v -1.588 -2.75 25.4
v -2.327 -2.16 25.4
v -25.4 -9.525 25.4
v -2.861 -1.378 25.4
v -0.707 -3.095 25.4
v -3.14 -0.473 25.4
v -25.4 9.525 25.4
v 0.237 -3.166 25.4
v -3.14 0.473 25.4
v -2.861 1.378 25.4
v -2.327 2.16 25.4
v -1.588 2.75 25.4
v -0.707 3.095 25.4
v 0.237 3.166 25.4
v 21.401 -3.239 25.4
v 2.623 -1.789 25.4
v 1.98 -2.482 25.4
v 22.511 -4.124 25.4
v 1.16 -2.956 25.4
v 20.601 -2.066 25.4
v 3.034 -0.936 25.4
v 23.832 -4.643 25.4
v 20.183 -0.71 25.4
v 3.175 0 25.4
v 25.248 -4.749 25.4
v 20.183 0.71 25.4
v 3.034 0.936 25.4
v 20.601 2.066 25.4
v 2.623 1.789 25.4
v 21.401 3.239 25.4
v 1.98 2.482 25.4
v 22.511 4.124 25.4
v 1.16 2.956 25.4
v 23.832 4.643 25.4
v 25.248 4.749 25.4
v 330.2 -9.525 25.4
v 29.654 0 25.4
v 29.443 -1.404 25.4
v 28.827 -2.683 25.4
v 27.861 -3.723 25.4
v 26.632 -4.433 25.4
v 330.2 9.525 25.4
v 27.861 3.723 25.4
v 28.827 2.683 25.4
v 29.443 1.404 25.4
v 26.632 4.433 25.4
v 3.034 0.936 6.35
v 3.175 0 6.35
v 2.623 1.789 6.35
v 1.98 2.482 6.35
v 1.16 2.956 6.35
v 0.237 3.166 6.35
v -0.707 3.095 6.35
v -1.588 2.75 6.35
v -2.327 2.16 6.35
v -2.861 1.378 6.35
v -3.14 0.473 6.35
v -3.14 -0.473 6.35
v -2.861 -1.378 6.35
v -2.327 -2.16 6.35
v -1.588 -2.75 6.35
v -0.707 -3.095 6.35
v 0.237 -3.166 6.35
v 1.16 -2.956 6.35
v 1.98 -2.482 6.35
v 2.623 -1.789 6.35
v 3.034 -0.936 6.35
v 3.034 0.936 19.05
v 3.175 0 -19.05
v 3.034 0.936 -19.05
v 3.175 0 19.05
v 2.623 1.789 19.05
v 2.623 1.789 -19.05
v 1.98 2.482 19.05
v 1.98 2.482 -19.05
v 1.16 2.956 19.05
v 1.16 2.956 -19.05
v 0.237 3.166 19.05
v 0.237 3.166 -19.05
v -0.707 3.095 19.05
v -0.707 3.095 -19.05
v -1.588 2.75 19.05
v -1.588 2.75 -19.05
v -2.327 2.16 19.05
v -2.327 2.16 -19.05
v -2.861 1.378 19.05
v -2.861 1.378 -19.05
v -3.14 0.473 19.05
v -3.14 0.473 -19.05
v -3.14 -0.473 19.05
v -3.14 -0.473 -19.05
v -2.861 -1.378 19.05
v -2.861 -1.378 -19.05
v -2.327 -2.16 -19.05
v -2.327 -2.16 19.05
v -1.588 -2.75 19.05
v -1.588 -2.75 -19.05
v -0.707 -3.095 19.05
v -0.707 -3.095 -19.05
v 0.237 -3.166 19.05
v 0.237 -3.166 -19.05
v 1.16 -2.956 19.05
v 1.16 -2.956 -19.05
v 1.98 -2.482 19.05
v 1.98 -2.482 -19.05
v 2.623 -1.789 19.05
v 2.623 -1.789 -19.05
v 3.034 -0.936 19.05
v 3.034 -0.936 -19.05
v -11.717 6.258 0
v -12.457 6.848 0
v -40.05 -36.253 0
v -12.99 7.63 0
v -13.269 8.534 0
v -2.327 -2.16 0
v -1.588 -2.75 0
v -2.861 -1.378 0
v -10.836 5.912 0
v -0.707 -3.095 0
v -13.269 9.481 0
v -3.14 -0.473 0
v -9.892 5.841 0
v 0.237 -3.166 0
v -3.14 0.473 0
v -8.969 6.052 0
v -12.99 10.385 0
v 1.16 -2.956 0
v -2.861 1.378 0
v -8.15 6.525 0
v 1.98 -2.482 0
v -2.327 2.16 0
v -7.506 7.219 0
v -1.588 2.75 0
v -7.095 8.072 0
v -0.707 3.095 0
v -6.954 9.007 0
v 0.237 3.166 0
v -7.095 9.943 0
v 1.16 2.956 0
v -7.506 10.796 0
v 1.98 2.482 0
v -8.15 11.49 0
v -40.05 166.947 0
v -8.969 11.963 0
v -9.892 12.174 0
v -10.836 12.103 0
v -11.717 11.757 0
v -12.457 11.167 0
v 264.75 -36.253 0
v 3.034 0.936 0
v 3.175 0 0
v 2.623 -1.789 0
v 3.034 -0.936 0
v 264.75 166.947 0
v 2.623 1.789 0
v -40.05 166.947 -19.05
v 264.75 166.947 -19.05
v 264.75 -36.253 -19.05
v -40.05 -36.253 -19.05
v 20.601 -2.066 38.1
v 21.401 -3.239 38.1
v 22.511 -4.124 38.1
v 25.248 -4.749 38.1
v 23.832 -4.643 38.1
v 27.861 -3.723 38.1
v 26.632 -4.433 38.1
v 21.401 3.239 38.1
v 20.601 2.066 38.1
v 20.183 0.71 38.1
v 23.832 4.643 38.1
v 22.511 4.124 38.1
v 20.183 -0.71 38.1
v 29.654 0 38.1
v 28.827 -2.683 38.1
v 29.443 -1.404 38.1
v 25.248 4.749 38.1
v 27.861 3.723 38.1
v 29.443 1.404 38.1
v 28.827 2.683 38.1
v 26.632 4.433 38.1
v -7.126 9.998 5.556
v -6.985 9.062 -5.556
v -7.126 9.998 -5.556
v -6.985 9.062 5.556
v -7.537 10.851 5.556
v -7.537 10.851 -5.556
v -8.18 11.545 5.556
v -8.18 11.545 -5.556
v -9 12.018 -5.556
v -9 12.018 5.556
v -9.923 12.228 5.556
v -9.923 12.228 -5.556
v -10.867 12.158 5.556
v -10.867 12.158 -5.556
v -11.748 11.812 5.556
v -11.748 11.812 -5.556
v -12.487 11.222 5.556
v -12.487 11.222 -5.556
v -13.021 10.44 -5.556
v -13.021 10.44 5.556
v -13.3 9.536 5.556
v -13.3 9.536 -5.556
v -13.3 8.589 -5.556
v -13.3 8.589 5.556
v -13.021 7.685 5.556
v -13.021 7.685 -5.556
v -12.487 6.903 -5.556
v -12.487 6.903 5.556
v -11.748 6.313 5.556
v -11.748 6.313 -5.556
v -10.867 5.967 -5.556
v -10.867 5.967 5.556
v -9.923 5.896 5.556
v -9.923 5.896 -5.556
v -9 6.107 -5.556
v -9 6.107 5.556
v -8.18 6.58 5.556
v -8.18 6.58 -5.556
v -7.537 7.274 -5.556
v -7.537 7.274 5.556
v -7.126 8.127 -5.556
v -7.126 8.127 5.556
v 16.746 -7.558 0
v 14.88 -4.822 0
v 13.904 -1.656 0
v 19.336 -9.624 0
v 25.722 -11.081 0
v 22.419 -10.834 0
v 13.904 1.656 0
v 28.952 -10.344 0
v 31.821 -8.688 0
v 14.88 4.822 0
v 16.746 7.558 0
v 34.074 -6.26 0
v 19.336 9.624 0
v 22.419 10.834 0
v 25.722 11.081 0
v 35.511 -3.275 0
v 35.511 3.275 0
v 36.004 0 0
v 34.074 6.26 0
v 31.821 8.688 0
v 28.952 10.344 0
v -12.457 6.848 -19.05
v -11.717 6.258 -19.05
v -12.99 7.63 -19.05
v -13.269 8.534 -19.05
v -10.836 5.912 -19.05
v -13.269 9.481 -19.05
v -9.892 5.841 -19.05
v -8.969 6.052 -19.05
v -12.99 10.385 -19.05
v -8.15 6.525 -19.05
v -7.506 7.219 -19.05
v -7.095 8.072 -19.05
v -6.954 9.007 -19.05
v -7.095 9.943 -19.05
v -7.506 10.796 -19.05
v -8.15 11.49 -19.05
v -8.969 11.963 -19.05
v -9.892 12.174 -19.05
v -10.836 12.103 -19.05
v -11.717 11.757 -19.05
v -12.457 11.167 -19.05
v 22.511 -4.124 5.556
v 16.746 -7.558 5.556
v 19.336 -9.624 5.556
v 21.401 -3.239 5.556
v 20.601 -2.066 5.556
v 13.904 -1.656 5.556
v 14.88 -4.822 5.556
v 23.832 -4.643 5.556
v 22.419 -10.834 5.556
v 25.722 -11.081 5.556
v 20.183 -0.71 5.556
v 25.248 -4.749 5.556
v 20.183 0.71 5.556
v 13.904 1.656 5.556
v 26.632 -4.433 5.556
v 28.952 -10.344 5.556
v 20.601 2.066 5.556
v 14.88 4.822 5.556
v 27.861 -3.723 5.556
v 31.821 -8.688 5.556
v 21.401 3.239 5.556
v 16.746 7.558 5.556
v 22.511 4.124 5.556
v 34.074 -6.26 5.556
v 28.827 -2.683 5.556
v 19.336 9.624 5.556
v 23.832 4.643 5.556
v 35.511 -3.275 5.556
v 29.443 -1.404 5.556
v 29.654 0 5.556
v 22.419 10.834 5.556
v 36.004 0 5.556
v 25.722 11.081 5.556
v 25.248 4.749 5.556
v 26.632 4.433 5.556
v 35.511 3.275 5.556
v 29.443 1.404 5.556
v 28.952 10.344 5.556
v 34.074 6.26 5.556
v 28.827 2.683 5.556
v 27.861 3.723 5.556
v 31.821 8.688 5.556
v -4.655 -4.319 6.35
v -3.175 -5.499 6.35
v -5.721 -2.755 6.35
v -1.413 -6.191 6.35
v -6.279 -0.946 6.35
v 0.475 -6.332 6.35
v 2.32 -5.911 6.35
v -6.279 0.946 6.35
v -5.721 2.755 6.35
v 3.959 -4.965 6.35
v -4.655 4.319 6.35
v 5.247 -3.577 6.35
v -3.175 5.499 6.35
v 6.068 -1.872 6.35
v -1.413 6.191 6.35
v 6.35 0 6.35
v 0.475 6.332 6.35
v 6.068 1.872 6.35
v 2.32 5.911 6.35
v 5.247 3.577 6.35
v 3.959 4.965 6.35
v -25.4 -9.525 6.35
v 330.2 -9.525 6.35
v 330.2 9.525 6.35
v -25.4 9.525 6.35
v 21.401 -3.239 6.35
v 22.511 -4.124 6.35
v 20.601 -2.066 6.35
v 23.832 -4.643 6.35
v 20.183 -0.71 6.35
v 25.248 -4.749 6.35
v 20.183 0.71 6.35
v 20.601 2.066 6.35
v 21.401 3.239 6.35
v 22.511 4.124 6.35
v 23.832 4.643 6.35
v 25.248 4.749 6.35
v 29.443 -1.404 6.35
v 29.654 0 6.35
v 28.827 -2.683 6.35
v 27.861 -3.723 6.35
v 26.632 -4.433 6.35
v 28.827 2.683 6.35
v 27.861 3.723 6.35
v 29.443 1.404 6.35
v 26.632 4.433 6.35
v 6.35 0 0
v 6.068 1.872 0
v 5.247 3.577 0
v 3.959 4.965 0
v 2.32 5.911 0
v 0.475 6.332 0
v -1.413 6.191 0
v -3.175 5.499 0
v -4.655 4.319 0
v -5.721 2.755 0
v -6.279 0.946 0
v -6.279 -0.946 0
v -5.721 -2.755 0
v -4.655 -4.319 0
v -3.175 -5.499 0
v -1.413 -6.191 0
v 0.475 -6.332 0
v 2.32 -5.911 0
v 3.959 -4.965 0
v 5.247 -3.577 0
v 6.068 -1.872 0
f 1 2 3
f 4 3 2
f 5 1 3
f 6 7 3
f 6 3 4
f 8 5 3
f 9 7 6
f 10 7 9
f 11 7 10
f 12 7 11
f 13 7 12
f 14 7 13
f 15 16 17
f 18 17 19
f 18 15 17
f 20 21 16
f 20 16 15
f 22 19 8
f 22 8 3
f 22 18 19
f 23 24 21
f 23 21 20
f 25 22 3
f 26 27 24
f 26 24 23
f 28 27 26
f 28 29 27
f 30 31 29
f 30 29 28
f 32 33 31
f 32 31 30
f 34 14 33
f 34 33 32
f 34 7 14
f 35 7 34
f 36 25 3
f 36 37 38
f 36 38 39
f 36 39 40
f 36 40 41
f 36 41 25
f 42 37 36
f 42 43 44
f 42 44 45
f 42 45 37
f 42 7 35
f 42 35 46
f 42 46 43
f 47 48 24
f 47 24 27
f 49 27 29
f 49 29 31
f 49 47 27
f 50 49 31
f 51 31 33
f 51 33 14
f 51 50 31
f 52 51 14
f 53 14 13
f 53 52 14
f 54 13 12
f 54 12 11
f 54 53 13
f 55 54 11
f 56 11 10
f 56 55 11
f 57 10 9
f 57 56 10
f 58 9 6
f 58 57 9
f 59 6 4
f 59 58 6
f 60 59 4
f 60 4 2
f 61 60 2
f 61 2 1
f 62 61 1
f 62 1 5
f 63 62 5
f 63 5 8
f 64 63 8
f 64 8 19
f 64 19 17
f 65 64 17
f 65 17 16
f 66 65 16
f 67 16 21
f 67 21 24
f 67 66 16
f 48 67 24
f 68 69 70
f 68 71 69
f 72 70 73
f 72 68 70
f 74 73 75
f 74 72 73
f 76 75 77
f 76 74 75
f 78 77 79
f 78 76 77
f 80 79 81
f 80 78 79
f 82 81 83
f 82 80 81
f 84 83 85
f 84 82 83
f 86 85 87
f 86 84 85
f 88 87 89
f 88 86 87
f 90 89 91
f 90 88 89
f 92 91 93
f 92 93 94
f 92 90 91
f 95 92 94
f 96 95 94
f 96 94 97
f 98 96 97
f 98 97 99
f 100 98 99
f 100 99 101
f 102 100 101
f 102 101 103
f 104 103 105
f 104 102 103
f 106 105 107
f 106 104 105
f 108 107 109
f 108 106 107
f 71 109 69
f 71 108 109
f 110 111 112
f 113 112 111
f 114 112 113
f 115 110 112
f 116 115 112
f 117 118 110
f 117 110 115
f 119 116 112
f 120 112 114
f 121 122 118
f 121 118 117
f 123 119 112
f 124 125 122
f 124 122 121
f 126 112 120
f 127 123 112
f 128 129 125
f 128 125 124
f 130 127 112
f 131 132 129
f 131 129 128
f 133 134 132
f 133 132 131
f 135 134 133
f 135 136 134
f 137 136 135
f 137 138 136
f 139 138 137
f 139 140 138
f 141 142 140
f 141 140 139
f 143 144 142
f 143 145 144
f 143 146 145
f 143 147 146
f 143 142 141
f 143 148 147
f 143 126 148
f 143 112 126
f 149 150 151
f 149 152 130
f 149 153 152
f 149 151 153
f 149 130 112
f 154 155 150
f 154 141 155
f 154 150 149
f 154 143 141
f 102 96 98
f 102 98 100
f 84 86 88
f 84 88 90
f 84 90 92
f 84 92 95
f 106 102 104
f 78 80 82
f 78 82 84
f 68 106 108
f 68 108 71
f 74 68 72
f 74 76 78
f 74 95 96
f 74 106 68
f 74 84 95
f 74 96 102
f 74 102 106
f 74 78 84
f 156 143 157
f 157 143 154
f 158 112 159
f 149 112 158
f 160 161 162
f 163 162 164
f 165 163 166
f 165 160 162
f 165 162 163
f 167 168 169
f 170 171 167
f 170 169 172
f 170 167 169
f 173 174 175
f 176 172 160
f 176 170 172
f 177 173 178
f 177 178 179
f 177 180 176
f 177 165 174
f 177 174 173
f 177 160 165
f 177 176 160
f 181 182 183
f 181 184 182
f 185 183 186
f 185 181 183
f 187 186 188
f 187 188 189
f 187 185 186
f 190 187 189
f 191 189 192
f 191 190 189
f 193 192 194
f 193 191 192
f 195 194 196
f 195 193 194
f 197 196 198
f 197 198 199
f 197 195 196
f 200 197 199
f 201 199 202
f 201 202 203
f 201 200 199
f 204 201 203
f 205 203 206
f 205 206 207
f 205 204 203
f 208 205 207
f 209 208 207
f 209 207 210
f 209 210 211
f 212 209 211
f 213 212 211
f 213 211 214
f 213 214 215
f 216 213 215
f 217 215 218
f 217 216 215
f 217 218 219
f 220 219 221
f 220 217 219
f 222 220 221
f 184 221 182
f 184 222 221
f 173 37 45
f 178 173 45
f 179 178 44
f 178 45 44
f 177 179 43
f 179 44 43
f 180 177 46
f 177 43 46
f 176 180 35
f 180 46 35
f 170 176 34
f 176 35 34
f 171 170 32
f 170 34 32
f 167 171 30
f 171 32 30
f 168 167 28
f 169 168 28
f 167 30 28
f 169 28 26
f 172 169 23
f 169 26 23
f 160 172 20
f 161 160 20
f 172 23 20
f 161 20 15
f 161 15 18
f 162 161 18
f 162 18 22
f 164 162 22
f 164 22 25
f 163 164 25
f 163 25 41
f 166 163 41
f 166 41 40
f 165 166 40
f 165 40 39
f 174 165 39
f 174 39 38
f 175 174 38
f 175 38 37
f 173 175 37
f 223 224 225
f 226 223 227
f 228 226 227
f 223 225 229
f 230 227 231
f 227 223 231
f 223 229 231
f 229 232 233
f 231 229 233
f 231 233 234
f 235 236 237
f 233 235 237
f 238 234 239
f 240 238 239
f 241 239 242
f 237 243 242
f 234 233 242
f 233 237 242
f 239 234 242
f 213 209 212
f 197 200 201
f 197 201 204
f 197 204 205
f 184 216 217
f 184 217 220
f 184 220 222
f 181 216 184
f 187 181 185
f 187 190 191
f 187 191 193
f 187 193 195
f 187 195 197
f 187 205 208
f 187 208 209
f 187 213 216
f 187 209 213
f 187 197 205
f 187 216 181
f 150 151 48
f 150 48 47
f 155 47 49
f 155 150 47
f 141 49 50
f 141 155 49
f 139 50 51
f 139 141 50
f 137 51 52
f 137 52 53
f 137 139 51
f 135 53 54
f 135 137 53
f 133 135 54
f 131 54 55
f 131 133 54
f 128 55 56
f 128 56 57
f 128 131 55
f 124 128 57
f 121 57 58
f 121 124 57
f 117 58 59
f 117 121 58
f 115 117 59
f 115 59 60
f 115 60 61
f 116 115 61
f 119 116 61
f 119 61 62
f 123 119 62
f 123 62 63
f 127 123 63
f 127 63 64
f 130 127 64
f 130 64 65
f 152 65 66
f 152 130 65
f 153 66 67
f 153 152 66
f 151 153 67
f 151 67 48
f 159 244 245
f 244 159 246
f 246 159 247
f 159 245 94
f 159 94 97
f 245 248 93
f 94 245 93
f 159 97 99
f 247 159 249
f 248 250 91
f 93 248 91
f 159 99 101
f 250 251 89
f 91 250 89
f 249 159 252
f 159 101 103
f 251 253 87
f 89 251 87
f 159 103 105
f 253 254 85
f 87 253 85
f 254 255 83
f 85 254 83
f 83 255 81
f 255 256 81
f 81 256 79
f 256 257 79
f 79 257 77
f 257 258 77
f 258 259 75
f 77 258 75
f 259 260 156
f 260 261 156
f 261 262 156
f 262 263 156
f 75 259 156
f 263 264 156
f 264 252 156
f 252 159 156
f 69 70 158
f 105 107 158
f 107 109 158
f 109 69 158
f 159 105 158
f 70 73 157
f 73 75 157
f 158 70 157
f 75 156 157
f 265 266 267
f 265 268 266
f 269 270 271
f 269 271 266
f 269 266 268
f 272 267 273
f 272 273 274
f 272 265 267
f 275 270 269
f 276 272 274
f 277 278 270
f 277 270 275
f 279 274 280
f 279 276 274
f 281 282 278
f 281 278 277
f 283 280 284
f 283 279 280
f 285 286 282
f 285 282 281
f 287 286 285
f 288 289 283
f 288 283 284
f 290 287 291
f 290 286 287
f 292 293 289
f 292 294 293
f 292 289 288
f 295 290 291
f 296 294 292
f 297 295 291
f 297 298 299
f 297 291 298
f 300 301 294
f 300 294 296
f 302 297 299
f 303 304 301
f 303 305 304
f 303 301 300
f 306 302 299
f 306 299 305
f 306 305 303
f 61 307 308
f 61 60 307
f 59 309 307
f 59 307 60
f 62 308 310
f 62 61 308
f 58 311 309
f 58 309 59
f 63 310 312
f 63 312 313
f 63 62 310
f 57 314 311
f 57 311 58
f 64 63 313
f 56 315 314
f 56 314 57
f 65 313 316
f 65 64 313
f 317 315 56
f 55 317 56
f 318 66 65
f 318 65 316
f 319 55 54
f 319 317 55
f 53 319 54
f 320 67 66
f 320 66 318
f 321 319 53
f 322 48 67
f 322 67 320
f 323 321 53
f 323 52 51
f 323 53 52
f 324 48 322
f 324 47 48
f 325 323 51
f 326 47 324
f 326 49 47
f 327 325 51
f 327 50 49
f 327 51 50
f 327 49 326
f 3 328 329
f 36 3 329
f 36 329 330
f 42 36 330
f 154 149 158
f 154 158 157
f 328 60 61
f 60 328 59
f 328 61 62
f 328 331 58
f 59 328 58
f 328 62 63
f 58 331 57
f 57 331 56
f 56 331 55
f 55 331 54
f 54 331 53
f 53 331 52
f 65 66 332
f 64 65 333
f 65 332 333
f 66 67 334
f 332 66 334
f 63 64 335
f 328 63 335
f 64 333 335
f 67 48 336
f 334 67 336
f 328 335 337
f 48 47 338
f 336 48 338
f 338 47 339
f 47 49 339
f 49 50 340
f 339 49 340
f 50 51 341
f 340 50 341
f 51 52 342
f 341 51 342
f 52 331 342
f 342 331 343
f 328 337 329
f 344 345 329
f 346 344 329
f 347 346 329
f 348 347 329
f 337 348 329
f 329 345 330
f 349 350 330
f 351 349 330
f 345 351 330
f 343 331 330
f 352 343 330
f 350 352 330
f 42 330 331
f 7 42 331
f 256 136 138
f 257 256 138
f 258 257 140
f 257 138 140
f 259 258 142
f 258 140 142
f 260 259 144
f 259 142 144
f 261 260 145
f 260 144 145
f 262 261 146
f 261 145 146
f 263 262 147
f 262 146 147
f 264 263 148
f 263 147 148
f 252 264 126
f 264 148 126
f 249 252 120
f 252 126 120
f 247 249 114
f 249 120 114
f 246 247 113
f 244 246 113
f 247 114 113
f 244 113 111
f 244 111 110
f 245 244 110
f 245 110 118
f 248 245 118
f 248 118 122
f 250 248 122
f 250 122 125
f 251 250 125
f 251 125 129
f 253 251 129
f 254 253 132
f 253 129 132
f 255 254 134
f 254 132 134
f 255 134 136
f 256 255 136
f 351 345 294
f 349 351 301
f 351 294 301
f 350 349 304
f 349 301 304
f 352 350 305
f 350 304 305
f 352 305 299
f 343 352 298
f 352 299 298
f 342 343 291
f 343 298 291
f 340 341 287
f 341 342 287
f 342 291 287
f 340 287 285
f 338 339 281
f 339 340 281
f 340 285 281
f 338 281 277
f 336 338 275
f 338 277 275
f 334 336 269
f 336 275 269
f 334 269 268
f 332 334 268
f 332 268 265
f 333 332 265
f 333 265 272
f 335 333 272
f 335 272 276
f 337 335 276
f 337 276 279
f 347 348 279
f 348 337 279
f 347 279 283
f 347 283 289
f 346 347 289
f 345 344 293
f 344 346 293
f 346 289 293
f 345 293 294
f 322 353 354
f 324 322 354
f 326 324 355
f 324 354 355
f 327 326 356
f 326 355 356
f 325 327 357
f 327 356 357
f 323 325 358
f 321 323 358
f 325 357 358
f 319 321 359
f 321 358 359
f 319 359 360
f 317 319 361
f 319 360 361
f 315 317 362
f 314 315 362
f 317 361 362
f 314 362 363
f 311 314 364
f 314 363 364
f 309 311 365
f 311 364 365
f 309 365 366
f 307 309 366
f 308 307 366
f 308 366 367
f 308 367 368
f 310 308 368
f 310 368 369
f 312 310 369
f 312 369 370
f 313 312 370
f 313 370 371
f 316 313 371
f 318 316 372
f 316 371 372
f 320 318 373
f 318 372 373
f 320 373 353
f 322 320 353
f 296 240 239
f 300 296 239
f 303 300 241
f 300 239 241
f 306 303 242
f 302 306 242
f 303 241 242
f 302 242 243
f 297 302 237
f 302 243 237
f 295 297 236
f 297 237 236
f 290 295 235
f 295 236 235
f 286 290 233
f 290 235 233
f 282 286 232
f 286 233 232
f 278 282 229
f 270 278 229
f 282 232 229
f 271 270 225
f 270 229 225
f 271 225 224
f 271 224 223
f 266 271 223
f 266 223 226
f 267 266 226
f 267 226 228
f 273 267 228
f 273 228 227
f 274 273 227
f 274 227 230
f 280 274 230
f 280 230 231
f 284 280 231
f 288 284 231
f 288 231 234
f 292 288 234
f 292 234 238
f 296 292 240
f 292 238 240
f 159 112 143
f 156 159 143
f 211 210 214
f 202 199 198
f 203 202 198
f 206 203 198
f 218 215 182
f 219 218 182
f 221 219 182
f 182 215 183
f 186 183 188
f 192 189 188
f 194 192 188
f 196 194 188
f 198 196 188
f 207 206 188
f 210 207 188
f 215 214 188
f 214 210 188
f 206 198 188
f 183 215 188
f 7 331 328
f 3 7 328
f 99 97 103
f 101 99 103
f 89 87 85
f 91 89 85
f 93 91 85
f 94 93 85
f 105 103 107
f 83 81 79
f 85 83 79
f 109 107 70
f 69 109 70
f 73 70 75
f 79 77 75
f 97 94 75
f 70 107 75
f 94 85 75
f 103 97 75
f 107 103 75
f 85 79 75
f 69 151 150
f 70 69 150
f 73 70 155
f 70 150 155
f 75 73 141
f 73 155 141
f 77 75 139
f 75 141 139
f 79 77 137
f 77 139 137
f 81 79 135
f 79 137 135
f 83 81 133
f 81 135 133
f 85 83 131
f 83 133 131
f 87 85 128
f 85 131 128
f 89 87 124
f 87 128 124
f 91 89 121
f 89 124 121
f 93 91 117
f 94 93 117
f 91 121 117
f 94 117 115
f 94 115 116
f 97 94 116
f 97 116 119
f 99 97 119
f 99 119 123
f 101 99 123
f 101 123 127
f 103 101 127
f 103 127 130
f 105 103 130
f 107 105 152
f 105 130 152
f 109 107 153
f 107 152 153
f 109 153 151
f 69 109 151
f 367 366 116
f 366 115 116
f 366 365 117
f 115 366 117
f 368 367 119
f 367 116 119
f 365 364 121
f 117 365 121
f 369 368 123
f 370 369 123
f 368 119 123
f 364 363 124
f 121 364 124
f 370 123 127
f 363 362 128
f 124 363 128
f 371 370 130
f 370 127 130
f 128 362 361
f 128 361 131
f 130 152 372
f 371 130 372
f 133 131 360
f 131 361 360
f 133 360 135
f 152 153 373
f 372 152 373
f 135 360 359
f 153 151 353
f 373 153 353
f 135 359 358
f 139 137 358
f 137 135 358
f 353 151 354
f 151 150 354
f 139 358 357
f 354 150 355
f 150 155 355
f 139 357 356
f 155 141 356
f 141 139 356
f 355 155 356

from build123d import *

# Parameters (mm, degrees)
F0_R     = 3.175
F1_DEPTH = 19.05
F2_DEPTH = 5.55625
F0_R_2   = 6.35
F3_DEPTH = 6.35
F0_R_3   = 11.1125
F0_R_4   = 4.7625
F4_DEPTH = 5.55625
F5_DEPTH = 38.1
F6_W     = 304.8
F6_H     = 203.2
F6_R     = 3.175
F7_DEPTH = 19.05
F8_R     = 6.35
F8_R_2   = 3.175
F9_DEPTH = 19.05


with BuildPart() as f1:
    # F0 (on Top) → F1 (new body, symmetric)
    with BuildSketch(Plane.XY):
        Circle(F0_R)
    extrude(amount=F1_DEPTH, both=True)


with BuildPart() as f2:
    # F0 (on Top) → F2 (new body, symmetric)
    with BuildSketch(Plane.XY):
        with Locations((-10.16, 9.0623555084)):
            Circle(F0_R)
    extrude(amount=F2_DEPTH, both=True)


with BuildPart() as f3:
    # F0 (on Top) → F3 (new body)
    with BuildSketch(Plane.XY):
        Circle(F0_R_2)
        Circle(F0_R, mode=Mode.SUBTRACT)
    extrude(amount=F3_DEPTH)


with BuildPart() as f4:
    # F0 (on Top) → F4 (new body)
    with BuildSketch(Plane.XY):
        with Locations((24.892, 0)):
            Circle(F0_R_3)
        with Locations((24.892, 0)):
            Circle(F0_R_4, mode=Mode.SUBTRACT)
    extrude(amount=F4_DEPTH)

    # F0 (on Top) → F5 (join)
    with BuildSketch(Plane.XY):
        with Locations((24.892, 0)):
            Circle(F0_R_4)
    extrude(amount=F5_DEPTH)

    # F8 (on face) → F9 (join)
    with BuildSketch(Plane.XY.offset(6.35)):
        Polygon((-25.4, 9.525), (-25.4, -9.525), (25.4, -9.525), (330.2, -9.525), (330.2, 9.525), (25.4, 9.525), align=None)
        Circle(F8_R, mode=Mode.SUBTRACT)
        Circle(F8_R)
        Circle(F8_R_2, mode=Mode.SUBTRACT)
    extrude(amount=F9_DEPTH)


with BuildPart() as f7:
    # F6 (on Top) → F7 (new body)
    with BuildSketch(Plane.XY):
        with Locations((112.3497951567, 65.3468792498)):
            Rectangle(F6_W, F6_H)
        with Locations((-10.1294061169, 9.0074846521)):
            Circle(F6_R, mode=Mode.SUBTRACT)
        Circle(F6_R, mode=Mode.SUBTRACT)
    extrude(amount=-F7_DEPTH)


solid = Compound([f1.part, f2.part, f3.part, f4.part, f7.part])
